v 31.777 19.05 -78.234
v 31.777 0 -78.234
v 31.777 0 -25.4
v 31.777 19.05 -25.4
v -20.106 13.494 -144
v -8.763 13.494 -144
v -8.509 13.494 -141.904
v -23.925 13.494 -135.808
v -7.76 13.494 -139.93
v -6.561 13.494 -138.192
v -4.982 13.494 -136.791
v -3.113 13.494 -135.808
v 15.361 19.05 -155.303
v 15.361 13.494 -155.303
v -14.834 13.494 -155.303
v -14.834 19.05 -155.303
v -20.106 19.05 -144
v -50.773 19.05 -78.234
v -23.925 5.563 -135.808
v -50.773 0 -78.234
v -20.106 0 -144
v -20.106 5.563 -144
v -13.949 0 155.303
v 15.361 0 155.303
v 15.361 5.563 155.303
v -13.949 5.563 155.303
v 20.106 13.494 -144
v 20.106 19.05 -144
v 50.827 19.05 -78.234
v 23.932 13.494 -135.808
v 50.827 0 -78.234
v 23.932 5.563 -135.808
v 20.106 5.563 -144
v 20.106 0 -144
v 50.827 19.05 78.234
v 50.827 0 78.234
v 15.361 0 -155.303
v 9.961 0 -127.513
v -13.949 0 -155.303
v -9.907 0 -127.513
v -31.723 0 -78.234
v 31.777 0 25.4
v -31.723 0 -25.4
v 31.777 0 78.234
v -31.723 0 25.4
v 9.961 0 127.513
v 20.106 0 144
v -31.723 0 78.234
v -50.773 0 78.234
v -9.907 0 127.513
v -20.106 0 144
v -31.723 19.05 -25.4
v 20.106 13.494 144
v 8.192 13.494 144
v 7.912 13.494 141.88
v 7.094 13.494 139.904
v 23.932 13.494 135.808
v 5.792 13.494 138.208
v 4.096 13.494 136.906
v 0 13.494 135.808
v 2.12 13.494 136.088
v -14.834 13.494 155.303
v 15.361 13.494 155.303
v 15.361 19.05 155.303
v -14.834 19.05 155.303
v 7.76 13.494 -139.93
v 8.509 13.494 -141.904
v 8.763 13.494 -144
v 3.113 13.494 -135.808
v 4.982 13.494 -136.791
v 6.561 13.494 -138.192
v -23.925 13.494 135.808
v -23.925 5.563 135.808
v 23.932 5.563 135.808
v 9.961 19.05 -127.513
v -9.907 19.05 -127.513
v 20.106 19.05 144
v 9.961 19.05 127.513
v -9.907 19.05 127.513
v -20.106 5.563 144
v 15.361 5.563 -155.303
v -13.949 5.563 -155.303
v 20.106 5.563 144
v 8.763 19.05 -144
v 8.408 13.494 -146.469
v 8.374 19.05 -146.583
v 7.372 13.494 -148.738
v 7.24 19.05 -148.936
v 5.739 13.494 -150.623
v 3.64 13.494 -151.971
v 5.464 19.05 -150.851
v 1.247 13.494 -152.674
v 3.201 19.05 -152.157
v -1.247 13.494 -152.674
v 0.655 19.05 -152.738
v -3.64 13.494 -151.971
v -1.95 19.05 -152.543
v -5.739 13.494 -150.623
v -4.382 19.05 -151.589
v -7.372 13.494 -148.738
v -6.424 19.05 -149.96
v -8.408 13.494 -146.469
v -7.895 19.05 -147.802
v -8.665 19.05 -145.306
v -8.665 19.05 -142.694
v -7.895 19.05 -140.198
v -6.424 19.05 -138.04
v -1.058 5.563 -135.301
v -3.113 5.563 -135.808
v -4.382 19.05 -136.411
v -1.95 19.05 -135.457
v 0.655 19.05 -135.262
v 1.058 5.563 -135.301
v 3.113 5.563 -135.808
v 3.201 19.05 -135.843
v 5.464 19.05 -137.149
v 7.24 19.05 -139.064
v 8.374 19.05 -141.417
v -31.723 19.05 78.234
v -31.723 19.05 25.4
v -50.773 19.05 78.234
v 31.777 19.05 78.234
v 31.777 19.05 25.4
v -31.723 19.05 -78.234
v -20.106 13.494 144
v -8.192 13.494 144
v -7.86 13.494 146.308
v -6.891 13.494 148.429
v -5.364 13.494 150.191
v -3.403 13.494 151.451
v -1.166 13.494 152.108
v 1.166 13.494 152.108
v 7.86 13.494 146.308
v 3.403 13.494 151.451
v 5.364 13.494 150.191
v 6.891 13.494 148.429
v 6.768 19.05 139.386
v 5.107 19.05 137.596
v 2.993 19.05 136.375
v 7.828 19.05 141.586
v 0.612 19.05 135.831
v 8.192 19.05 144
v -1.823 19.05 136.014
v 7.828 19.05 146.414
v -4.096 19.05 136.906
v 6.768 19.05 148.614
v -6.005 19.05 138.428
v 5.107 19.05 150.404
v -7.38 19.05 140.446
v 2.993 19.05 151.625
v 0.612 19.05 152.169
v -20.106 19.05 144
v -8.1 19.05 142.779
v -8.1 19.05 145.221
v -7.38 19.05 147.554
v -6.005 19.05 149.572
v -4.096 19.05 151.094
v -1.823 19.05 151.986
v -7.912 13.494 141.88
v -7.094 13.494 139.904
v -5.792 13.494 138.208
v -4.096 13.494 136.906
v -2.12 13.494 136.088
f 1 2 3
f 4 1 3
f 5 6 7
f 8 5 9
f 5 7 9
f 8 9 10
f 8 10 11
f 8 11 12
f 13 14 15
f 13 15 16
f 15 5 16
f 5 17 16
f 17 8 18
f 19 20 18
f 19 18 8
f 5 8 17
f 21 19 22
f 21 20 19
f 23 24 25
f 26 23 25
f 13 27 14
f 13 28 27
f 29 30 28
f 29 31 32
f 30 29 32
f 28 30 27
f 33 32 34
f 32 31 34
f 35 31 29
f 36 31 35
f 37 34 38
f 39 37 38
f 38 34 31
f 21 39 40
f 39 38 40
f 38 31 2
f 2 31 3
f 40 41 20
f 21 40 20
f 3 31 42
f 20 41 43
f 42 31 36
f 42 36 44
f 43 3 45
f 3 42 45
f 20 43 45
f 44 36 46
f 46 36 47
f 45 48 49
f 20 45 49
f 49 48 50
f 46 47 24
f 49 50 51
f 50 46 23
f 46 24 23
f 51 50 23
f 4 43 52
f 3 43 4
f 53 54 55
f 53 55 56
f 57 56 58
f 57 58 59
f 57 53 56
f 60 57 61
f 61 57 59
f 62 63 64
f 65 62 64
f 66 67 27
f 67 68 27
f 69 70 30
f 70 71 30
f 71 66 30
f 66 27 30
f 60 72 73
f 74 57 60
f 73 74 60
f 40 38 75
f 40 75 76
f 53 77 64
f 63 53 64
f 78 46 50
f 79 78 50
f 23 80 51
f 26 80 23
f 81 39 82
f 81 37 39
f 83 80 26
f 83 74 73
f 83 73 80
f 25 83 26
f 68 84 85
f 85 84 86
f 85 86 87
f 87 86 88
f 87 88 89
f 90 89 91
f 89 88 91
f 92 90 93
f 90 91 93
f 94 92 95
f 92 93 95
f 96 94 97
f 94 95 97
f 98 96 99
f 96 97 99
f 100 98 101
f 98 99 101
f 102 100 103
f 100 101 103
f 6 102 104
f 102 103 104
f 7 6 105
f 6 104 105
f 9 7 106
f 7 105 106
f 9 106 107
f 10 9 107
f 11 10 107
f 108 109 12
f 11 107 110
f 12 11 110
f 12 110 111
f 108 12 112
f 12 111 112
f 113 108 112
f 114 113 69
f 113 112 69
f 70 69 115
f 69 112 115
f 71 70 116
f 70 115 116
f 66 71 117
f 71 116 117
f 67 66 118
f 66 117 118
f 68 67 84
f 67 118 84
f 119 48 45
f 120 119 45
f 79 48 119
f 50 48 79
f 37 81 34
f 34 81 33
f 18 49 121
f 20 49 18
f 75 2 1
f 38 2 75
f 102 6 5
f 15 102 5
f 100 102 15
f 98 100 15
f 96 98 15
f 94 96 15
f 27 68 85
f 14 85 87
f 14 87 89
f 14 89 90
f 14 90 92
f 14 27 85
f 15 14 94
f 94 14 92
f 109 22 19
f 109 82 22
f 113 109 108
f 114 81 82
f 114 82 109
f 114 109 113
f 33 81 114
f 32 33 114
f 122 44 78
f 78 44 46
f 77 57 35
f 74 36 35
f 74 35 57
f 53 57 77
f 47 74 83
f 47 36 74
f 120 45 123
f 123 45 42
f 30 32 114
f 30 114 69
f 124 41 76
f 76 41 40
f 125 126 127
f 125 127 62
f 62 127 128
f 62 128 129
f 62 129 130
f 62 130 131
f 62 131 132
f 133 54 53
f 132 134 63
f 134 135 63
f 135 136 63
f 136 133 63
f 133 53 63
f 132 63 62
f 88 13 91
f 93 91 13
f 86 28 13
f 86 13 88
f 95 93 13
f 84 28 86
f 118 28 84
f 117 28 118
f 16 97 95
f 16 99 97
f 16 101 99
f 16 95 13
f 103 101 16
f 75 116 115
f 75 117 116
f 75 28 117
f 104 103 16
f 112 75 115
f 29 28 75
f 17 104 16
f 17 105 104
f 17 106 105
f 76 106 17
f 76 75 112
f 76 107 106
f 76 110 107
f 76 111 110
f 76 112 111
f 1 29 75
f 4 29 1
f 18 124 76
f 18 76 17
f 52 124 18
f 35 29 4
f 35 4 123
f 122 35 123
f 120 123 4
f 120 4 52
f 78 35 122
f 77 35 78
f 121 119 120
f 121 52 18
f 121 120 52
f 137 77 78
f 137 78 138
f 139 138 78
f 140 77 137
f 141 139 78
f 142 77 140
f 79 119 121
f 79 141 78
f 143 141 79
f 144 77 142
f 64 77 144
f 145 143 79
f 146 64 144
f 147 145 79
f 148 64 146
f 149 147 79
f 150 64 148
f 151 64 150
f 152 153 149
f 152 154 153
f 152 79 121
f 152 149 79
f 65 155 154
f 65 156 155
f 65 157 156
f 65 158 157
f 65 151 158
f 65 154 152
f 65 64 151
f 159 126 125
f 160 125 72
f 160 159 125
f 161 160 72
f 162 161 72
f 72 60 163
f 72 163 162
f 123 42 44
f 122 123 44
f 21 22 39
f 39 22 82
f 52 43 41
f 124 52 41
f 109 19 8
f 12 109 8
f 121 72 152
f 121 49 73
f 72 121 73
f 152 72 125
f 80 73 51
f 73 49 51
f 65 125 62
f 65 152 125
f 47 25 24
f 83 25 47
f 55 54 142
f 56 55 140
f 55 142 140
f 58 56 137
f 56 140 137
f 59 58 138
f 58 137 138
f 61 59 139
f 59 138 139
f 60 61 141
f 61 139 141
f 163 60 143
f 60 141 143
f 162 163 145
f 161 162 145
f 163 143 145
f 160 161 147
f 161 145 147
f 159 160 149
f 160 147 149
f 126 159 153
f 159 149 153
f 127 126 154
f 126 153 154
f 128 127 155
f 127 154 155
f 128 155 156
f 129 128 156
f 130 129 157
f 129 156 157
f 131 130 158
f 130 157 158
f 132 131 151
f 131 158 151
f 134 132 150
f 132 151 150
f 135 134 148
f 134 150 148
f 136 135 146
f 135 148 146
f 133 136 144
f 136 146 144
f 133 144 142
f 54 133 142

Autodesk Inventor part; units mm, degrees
ref_plane "YZ Plane" through (0, 0, 0) normal (1, 0, 0) x (0, 1, 0)
ref_plane "XZ Plane" through (0, 0, 0) normal (0, 1, 0) x (-1, 0, 0)
ref_plane "XY Plane" through (0, 0, 0) normal (0, 0, 1) x (1, 0, 0)
sketch "Sketch1" plane through (0, 0, 0) normal (0, 1, 0) x (-1, 0, 0)
  line L0 (0, -213.8682) -> (0, 213.8682) projected
  line L1 (20.1057, -144) -> (-20.1057, -144)
  line L2 (-50.827, -78.2337) -> (-50.827, 78.2337)
  line L3 (-20.1057, 144) -> (20.1057, 144)
  line L4 (50.773, 78.2337) -> (50.773, -78.2337)
  line L5 (158.1712, 0) -> (-85.66, 0) projected
  line L6 (50.773, 78.2337) -> (20.1057, 144)
  line L7 (50.773, 78.2337) -> (123.3381, 78.2337) construction
  line L8 (-50.827, 78.2337) -> (-20.1057, 144)
  line L9 (-20.1057, 144) -> (20.1057, 144)
  line L10 (31.723, 78.2337) -> (31.723, -78.2337)
  line L11 (-31.777, -78.2337) -> (-31.777, 78.2337)
  line L12 (-20.1057, -144) -> (20.1057, -144)
  line L13 (50.773, -78.2337) -> (20.1057, -144)
  line L14 (-50.827, -78.2337) -> (-20.1057, -144)
  line L15 (31.723, -25.4) -> (31.723, 25.4)
  line L16 (31.723, -25.4) -> (-31.777, -25.4)
  line L17 (31.723, 25.4) -> (-31.777, 25.4)
  line L18 (31.723, 78.2337) -> (9.9071, 127.5128)
  line L19 (-31.777, 78.2337) -> (-9.9611, 127.5128)
  line L20 (-9.9611, 127.5128) -> (9.9071, 127.5128)
  line L21 (50.773, 78.2337) -> (31.723, 78.2337)
  line L22 (-31.777, 78.2337) -> (-50.827, 78.2337)
  line L23 (31.723, -78.2337) -> (9.9071, -127.5128)
  line L24 (-31.777, -78.2337) -> (-9.9611, -127.5128)
  line L25 (-9.9611, -127.5128) -> (9.9071, -127.5128)
  line L26 (50.773, -78.2337) -> (31.723, -78.2337)
  line L27 (-31.777, -78.2337) -> (-50.827, -78.2337)
  point P0 (50.8, -140)
  point P1 (-50.8, 140)
  point P2 (-50.8, -140)
  dimension "d49" = 280
  dimension "d51" = 115
  dimension "d52" = 101.6
  dimension "d53" = 50.8
  dimension "d71" = 288
extrude "Extrusion1" add sketch "Sketch1" along normal blind 19.05 contours L1 L14 L27 L24 L25 L0 | L0 L25 L23 L26 L13 L1 | L16 L11 L5 L0 | L0 L5 L10 L16 | L26 L10 L5 L4 | L2 L5 L11 L27 | L5 L11 L17 L0 | L0 L17 L10 L5 | L5 L10 L21 L4 | L2 L22 L11 L5 | L21 L18 L20 L0 L3 L6 | L8 L3 L0 L20 L19 L22
sketch "Sketch9" plane through (50.827, 0, 78.2337) normal (1, 0, 0) x (0, 0, -1)
  line L0 (-65.7663, 19.05) -> (0, 19.05) projected
  line L1 (-65.7663, 19.05) -> (-65.7663, 0)
  line L2 (-65.7663, 0) -> (-65.7663, 19.05) projected
  line L3 (-65.7663, 9.525) -> (-52.4585, 9.525)
  line L4 (-65.7663, 13.4938) -> (-65.7663, 5.5563)
  line L5 (-65.7663, 19.05) -> (-77.0693, 19.05)
  line L6 (-65.7663, 19.05) -> (-54.4633, 19.05) construction
  line L7 (-65.7663, 13.4938) -> (-77.0693, 13.4937)
  line L8 (-77.0693, 13.4937) -> (-77.0693, 19.05)
  line L9 (-65.7663, 19.05) -> (-65.7663, 13.4938)
  line L10 (78.2337, -3.81) -> (78.2337, 22.86) projected
  line L11 (222.2337, 19.05) -> (233.5367, 19.05)
  line L12 (222.2337, 13.4938) -> (233.5367, 13.4937)
  line L13 (233.5367, 13.4937) -> (233.5367, 19.05)
  line L14 (222.2337, 19.05) -> (222.2337, 13.4938)
  point P0 (78.2337, 0)
  dimension "d55" = 7.9375
  dimension "d56" = 11.303
  dimension "d57" = 180
extrude "Extrusion9" add sketch "Sketch9" against normal up to surface (70.9326 mm away)
sketch "Sketch10" plane through (0, 19.05, 0) normal (0, 1, 0) x (1, 0, 0)
  line L0 (20.1057, -144) -> (50.827, -78.2337) projected
  line L1 (20.1057, -144) -> (15.3607, -155.303)
  line L2 (50.827, -155.303) -> (-20.1057, -155.303) projected
  line L3 (15.3607, -155.303) -> (50.53, -155.303)
  line L4 (50.827, -144) -> (20.1057, -144) projected
  line L5 (20.1057, -144) -> (50.827, -144)
  line L6 (50.827, -144) -> (50.827, -155.303) projected
  line L7 (50.827, -144) -> (50.827, -155.303)
  line L8 (50.827, -155.303) -> (50.827, -144)
  line L9 (50.827, -155.303) -> (15.3607, -155.303)
  line L10 (-71.093, 0) -> (71.147, 0) projected
  line L11 (20.1057, 144) -> (15.3607, 155.303)
  line L12 (15.3607, 155.303) -> (50.53, 155.303)
  line L13 (50.827, 144) -> (20.1057, 144)
  line L14 (20.1057, 144) -> (50.827, 144)
  line L15 (50.827, 144) -> (50.827, 155.303)
  line L16 (50.827, 144) -> (50.827, 155.303)
  line L17 (50.827, 155.303) -> (50.827, 144)
  line L18 (50.827, 155.303) -> (15.3607, 155.303)
  line L19 (-20.1057, -144) -> (-14.8343, -155.303)
  line L20 (-20.1057, -155.303) -> (-14.8343, -155.303)
  line L21 (-50.773, -78.2337) -> (-20.1057, -144) projected
  line L22 (-20.1057, -155.303) -> (-20.1057, -144)
  line L23 (-20.1057, 144) -> (-14.8343, 155.303)
  line L24 (-20.1057, 155.303) -> (-14.8343, 155.303)
  line L25 (-20.1057, 155.303) -> (-20.1057, 144)
  point P0 (0, 0)
extrude "Extrusion10" cut sketch "Sketch10" against normal up to surface (19.05 mm away)
sketch "Sketch11" plane through (50.827, 0, 78.2337) normal (1, 0, 0) x (0, 0, -1)
  line L0 (-65.7663, 0) -> (-65.7663, 13.4938) projected
  line L1 (-65.7663, 0) -> (-77.0693, 0)
  line L2 (-77.0693, 0) -> (-77.0693, 5.5626)
  line L3 (-77.0693, 5.5626) -> (-65.7663, 5.5626)
  line L4 (-77.0693, 19.05) -> (-65.7663, 19.05) projected
  line L5 (78.2337, -3.81) -> (78.2337, 22.86) projected
  line L6 (222.2337, 0) -> (233.5367, 0)
  line L7 (233.5367, 0) -> (233.5367, 5.5626)
  line L8 (233.5367, 5.5626) -> (222.2337, 5.5626)
  line L9 (222.2337, 0) -> (222.2337, 13.4938) projected
  line L10 (222.2337, 5.5626) -> (222.2337, 0)
  point P0 (78.2337, 0)
  dimension "d63" = 5.5626
  dimension "d76" = 11.303
extrude "Extrusion11" add sketch "Sketch11" against normal up to surface (70.9326 mm away)
sketch "Sketch12" plane through (50.827, 5.5626, -144) normal (0, 1, 0) x (1, 0, 0)
  line L0 (-70.9326, 11.303) -> (-70.9326, 0) projected
  line L1 (-70.9326, 11.303) -> (-70.9326, 0)
  line L2 (-70.9326, 0) -> (-64.7758, 11.303)
  line L3 (-64.7758, 11.303) -> (-70.9326, 11.303)
  line L4 (-35.4663, 11.303) -> (-65.6612, 11.303) projected
  line L5 (-35.4663, 11.303) -> (-30.7213, 0)
  line L6 (0, 0) -> (0, 11.303) projected
  line L7 (-30.7213, 0) -> (0, 0)
  line L8 (0, 0) -> (0, 11.303)
  line L9 (0, 11.303) -> (-35.4663, 11.303)
  line L10 (-121.92, -144) -> (20.32, -144) projected
  line L11 (-70.9326, -299.303) -> (-70.9326, -288)
  line L12 (-70.9326, -299.303) -> (-70.9326, -288)
  line L13 (-70.9326, -288) -> (-64.7758, -299.303)
  line L14 (-64.7758, -299.303) -> (-70.9326, -299.303)
  line L15 (-35.4663, -299.303) -> (-65.6612, -299.303)
  line L16 (-35.4663, -299.303) -> (-30.7213, -288)
  line L17 (0, -288) -> (0, -299.303)
  line L18 (-30.7213, -288) -> (0, -288)
  line L19 (0, -288) -> (0, -299.303)
  line L20 (0, -299.303) -> (-35.4663, -299.303)
  point P0 (-50.827, -144)
extrude "Extrusion12" cut sketch "Sketch12" against normal through all
sketch "Sketch13" plane through (0, 19.05, 0) normal (0, 1, 0) x (1, 0, 0)
  circle A0 centre (0, -144) radius 8.1915
  circle A1 centre (0, 144) radius 8.763
  line L0 (-71.093, 0) -> (71.147, 0) projected
  point P0 (0, 0)
  dimension "d68" = 16.383
  dimension "d69" = 17.526
  dimension "d70" = 288
extrude "Extrusion13" cut sketch "Sketch13" against normal up to surface (13.4874 mm away)
sketch "Sketch14" plane through (50.827, 0, 78.2337) normal (1, 0, 0) x (0, 0, -1)
  line L0 (-57.5748, 19.05) -> (-57.5748, 5.5626) projected
  line L1 (-57.5748, 19.05) -> (-57.5748, 5.5626) projected
  line L2 (-57.5748, 19.05) -> (-57.5748, 5.5626) projected
  line L3 (-65.7663, 13.4938) -> (-57.5748, 13.4938)
  line L4 (-57.5748, 5.5626) -> (-57.5748, 13.4938)
  line L5 (-65.7663, 5.5626) -> (-65.7663, 13.4938) projected
  line L6 (-57.5748, 5.5626) -> (-65.7663, 5.5626)
  line L7 (78.2337, -3.81) -> (78.2337, 22.86) projected
  line L8 (222.2337, 13.4938) -> (214.0422, 13.4938)
  line L9 (214.0422, 5.5626) -> (214.0422, 13.4938)
  line L10 (222.2337, 5.5626) -> (222.2337, 13.4938)
  line L11 (214.0422, 5.5626) -> (222.2337, 5.5626)
  point P0 (78.2337, 0)
extrude "Extrusion14" cut sketch "Sketch14" against normal through all
properties part number "Diff_BarV2"
